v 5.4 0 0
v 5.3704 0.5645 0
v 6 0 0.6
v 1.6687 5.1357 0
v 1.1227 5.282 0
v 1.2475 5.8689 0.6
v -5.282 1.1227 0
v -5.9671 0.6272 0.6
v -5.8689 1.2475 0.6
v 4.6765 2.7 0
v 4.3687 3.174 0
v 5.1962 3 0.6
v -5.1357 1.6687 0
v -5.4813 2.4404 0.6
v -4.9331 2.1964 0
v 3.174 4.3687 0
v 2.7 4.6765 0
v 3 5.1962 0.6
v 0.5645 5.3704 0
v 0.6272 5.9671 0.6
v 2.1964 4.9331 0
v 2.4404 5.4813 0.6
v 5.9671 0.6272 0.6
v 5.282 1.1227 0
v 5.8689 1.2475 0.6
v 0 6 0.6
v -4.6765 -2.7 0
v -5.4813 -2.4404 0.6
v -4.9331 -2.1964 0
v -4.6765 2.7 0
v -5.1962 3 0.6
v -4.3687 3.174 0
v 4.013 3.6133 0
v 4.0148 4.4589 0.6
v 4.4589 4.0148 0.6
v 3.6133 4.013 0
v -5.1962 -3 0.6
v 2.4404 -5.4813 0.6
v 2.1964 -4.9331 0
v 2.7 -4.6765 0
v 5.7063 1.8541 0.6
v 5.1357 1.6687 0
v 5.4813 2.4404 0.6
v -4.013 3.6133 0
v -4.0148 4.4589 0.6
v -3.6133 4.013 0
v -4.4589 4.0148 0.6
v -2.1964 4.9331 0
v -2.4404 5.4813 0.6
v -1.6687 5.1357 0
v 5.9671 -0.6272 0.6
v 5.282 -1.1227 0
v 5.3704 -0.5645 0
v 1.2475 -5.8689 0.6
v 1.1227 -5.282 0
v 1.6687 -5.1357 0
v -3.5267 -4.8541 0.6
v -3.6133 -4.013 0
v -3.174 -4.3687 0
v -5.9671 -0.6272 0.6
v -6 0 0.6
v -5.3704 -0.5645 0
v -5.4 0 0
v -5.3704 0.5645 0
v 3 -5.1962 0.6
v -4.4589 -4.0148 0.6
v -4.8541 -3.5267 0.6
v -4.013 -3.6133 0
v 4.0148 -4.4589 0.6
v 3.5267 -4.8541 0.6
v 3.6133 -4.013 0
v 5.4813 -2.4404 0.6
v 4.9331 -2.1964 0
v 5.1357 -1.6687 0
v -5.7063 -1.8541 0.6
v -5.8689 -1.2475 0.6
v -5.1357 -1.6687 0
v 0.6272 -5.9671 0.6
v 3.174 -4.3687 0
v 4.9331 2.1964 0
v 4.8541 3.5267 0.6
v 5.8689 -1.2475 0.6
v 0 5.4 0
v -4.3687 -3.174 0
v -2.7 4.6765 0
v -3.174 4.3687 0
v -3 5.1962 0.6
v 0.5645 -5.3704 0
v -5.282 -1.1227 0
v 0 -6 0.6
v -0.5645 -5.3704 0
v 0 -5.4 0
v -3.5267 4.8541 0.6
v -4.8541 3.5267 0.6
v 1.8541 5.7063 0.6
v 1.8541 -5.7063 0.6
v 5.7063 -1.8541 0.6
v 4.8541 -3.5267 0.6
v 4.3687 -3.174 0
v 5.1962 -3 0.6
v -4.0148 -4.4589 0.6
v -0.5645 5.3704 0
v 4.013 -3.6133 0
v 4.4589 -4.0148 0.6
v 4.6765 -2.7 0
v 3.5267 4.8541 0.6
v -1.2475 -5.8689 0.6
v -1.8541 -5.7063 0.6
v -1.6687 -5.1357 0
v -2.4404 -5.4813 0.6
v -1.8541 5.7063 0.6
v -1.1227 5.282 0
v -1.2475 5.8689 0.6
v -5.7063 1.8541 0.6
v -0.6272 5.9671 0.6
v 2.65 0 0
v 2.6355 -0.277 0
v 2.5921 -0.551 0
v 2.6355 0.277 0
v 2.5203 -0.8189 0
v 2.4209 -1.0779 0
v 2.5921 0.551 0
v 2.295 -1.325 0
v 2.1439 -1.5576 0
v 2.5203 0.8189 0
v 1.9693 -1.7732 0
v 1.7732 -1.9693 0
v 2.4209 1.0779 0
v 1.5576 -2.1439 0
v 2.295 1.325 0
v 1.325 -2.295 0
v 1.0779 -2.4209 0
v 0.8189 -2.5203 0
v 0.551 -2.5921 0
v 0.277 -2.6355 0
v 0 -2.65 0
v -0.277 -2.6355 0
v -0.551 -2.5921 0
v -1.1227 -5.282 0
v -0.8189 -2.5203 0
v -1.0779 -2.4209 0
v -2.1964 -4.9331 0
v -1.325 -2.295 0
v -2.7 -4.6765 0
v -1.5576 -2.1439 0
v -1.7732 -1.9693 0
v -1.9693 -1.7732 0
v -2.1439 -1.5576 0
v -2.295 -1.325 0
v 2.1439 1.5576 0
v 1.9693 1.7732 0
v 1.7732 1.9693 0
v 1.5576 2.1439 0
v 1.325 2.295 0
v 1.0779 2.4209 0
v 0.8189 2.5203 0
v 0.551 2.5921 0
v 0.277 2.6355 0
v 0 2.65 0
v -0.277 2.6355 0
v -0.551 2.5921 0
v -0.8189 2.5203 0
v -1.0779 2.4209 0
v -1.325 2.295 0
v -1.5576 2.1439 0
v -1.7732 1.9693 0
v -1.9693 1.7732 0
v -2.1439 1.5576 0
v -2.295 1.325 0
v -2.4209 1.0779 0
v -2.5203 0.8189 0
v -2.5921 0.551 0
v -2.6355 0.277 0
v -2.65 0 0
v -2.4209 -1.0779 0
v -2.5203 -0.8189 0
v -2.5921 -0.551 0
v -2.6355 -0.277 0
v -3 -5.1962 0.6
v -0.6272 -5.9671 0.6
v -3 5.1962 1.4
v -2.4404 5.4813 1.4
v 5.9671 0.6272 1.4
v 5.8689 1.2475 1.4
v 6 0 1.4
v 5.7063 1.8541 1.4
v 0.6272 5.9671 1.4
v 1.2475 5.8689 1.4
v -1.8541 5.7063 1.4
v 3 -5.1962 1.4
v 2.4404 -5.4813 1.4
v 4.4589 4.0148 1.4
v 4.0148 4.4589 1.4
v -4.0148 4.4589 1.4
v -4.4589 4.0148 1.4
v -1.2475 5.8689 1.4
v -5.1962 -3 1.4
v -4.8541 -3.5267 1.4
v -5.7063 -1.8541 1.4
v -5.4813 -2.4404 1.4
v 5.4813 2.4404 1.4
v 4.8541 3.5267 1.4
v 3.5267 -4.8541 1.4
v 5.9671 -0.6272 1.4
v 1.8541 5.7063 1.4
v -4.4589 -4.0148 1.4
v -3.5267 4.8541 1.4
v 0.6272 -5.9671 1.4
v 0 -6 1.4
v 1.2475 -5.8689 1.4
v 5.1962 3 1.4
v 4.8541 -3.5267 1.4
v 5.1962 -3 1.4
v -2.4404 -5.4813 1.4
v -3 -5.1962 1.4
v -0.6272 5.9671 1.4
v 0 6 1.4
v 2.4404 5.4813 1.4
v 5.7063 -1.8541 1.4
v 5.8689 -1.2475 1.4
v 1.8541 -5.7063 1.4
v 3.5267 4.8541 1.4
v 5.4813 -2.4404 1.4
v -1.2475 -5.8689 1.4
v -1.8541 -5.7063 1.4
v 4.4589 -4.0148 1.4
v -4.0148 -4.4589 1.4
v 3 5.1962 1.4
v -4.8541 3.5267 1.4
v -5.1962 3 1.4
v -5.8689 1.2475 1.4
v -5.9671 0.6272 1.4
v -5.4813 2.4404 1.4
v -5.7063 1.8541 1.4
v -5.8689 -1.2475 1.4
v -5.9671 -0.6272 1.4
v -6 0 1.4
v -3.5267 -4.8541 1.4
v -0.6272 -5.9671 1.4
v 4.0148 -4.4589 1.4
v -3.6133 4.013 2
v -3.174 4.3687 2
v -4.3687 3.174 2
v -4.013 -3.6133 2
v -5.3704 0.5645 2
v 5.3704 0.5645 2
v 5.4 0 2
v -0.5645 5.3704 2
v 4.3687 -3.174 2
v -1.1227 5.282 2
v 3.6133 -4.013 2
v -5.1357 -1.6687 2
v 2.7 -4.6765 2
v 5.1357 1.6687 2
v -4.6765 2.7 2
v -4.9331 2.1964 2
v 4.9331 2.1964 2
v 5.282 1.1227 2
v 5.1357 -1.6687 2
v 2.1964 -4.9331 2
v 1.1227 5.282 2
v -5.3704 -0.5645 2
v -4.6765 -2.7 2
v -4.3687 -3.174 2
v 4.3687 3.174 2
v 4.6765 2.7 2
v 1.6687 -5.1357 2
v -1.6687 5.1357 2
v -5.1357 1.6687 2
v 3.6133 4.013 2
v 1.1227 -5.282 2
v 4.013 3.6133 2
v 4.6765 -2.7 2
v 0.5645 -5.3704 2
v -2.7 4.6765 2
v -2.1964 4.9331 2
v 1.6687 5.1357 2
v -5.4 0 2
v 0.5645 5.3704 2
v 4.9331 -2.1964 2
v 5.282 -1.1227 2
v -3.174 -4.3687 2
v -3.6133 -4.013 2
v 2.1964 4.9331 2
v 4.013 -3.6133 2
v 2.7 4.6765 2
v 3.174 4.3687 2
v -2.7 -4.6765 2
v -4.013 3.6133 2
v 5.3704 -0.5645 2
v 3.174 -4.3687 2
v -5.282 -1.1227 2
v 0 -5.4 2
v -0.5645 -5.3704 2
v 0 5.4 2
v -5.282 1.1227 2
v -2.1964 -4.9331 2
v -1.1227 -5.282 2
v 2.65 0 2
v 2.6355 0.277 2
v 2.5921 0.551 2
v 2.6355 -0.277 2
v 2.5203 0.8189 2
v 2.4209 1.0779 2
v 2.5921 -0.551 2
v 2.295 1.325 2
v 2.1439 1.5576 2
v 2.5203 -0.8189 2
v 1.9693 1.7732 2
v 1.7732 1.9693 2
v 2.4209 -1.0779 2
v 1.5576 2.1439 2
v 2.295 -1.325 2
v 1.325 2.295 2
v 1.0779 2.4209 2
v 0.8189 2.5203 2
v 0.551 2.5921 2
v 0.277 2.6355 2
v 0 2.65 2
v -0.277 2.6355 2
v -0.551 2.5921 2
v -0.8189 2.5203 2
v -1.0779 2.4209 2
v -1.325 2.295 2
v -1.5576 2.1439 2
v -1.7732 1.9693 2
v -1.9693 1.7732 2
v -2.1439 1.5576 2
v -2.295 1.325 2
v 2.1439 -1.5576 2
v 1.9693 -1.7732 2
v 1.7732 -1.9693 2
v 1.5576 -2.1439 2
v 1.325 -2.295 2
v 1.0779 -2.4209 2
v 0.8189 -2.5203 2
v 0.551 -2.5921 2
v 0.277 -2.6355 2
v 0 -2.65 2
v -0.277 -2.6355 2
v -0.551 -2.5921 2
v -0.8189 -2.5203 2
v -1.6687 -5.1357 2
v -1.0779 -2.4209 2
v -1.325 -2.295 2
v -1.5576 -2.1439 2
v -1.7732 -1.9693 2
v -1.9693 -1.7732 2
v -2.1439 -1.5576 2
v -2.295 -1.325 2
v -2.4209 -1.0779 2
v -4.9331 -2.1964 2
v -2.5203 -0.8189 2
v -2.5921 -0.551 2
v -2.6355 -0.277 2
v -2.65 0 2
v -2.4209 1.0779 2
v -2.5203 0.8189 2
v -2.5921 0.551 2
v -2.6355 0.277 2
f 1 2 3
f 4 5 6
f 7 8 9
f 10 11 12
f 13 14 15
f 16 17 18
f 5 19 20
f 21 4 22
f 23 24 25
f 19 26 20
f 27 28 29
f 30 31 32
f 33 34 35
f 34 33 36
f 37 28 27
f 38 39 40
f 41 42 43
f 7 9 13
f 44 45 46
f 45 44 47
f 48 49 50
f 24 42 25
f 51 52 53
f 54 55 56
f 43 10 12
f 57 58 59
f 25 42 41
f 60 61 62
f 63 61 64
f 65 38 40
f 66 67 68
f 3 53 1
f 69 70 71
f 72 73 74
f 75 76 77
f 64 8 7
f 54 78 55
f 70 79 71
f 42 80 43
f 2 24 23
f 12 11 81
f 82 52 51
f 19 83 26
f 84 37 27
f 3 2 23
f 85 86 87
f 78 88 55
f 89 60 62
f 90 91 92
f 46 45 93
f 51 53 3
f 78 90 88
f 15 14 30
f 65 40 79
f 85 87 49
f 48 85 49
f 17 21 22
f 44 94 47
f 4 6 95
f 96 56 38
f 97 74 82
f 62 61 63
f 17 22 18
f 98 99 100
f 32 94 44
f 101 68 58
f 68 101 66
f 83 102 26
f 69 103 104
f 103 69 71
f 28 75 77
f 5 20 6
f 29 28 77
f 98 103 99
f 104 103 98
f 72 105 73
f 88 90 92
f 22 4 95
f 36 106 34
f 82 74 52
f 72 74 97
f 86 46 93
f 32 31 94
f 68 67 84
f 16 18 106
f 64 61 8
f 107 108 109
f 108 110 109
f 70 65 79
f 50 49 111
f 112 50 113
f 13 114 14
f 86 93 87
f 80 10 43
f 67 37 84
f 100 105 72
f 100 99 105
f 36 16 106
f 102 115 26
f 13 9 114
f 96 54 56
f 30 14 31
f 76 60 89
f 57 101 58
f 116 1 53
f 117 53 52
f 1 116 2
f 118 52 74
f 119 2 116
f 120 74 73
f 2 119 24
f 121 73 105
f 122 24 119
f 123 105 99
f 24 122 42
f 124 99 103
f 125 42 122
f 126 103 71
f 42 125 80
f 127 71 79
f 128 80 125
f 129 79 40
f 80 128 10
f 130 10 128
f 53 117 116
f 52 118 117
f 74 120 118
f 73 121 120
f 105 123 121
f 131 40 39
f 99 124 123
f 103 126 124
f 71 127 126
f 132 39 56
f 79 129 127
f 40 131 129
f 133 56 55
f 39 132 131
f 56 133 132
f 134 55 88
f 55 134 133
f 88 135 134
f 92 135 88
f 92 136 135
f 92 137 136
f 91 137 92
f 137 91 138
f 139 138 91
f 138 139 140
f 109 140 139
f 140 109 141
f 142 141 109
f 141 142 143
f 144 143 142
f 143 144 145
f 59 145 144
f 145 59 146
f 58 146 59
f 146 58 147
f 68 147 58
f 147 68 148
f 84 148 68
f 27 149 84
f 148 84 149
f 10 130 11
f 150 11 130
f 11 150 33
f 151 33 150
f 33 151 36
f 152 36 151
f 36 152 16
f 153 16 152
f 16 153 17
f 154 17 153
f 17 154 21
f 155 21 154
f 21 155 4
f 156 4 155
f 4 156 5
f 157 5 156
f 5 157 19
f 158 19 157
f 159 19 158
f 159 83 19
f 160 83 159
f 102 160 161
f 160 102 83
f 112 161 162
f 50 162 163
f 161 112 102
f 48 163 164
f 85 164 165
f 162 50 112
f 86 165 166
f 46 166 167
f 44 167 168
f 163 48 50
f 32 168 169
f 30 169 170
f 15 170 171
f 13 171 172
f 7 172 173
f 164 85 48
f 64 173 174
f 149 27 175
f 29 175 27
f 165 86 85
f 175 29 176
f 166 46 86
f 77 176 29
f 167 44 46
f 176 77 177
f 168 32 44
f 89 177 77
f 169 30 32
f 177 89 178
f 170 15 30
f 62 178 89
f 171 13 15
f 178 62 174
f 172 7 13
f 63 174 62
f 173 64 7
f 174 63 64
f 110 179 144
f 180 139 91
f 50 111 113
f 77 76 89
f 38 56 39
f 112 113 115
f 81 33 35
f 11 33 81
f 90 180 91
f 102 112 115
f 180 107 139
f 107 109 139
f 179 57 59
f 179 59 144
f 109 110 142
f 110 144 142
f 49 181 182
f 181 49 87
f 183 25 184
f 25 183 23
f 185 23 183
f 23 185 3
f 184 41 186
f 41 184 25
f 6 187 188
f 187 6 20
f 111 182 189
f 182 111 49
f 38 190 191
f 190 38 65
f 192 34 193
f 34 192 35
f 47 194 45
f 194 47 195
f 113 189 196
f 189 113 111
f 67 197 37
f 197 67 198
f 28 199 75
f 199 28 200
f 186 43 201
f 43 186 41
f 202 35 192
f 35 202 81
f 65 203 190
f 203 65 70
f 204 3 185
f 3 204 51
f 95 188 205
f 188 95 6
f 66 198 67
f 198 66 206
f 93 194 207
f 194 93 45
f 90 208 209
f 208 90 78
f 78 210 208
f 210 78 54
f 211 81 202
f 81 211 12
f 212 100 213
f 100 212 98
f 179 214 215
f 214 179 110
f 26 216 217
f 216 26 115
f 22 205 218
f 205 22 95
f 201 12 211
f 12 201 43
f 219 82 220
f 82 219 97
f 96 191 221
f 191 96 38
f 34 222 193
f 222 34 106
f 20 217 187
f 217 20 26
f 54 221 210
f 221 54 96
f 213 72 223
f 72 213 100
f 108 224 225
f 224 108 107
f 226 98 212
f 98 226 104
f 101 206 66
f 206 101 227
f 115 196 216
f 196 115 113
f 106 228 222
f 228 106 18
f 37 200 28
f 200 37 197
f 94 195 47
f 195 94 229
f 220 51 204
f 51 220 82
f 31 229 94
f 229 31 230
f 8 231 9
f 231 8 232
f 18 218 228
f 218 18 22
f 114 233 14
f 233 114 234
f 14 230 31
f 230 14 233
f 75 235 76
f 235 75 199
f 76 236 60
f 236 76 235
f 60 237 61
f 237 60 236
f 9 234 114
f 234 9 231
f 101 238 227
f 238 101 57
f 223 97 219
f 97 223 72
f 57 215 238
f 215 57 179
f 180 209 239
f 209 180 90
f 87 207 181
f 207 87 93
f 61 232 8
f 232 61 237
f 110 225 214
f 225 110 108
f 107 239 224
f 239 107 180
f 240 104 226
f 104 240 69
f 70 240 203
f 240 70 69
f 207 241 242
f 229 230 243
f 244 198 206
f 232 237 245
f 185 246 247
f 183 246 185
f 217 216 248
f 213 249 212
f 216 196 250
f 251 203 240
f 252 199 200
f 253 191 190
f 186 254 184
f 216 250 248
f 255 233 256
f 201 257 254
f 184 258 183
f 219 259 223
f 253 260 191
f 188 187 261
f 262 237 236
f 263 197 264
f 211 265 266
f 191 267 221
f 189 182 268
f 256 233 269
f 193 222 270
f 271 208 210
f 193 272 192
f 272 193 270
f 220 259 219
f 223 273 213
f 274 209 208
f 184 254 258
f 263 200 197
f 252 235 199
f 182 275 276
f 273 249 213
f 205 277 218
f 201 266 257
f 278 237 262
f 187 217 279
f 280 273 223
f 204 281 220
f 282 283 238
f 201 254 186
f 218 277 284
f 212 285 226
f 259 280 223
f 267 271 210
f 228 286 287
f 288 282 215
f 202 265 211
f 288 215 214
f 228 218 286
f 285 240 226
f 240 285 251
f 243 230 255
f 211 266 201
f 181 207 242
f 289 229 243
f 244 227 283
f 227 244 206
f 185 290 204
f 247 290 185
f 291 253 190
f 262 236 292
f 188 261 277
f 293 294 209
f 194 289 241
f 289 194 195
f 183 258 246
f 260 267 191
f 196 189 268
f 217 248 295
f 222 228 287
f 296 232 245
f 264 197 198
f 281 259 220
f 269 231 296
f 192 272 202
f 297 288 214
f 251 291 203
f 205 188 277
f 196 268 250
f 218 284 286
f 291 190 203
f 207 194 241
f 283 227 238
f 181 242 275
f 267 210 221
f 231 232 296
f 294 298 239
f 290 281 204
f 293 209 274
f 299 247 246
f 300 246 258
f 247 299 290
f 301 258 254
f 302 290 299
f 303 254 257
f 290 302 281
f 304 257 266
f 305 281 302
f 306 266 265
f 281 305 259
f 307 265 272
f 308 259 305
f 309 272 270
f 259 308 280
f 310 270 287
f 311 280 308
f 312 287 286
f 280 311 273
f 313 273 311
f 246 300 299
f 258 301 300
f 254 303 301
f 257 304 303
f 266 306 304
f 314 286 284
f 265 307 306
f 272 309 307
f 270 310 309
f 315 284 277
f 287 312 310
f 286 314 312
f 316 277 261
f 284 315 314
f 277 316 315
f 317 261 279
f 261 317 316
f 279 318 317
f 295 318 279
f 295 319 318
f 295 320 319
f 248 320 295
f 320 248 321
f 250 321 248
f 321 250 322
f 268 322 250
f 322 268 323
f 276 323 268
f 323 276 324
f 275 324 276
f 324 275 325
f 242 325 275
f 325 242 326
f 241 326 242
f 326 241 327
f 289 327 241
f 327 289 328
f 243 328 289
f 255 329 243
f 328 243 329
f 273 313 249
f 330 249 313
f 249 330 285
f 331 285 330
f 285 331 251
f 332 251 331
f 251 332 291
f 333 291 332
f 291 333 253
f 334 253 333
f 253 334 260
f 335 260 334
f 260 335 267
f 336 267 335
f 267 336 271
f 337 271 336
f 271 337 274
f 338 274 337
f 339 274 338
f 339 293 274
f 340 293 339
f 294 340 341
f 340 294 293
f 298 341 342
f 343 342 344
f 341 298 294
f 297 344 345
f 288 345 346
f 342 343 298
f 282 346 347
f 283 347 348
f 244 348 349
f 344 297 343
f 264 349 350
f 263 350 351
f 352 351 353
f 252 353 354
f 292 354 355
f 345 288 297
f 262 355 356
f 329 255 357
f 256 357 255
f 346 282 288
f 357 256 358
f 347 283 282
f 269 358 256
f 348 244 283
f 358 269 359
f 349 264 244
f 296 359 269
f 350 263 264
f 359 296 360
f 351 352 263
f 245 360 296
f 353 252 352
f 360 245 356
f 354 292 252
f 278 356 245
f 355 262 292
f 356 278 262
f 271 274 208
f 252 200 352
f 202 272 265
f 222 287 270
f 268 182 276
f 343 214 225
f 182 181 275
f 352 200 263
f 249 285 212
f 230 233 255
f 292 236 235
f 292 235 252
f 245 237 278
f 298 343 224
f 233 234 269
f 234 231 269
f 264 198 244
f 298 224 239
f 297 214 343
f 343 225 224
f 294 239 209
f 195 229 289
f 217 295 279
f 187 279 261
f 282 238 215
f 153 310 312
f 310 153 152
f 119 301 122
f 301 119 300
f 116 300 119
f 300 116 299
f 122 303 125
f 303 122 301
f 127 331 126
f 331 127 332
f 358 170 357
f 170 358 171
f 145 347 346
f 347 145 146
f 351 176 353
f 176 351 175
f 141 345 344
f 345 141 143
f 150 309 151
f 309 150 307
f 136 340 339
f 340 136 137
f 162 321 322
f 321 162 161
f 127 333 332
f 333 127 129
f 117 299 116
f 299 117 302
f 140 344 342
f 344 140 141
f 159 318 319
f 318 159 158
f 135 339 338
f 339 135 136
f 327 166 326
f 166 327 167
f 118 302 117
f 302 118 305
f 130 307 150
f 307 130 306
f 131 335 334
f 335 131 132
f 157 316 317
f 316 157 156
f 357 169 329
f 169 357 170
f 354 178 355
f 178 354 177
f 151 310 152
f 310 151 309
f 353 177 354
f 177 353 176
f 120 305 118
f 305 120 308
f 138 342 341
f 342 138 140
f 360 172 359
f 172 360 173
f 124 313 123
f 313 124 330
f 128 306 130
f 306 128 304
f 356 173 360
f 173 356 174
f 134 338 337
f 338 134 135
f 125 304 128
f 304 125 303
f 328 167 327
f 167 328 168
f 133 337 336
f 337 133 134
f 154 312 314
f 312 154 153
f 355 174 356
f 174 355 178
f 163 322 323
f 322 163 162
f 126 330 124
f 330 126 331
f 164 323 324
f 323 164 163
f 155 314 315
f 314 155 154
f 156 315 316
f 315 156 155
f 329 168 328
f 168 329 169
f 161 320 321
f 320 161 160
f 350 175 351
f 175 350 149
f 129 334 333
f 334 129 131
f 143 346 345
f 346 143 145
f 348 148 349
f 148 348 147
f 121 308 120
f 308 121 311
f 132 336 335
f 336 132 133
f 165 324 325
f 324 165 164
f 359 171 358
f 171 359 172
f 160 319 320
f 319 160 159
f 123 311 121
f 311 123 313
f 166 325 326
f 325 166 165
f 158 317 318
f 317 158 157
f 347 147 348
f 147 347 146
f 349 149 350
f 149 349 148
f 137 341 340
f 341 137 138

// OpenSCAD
// Chamfered metric washer.
$fn = 60;
eps = 0.02;
inner_d = 5.3;
outer_d = 12;
thickness = 2;
chamfer = 0.6;
difference() {
    union() {
        cylinder(d1 = outer_d - 2 * chamfer, d2 = outer_d, h = chamfer);
        translate([0, 0, chamfer]) cylinder(d = outer_d, h = thickness - 2 * chamfer);
        translate([0, 0, thickness - chamfer]) cylinder(d1 = outer_d, d2 = outer_d - 2 * chamfer, h = chamfer);
    }
    translate([0, 0, -eps]) cylinder(d = inner_d, h = thickness + 2 * eps);
}
